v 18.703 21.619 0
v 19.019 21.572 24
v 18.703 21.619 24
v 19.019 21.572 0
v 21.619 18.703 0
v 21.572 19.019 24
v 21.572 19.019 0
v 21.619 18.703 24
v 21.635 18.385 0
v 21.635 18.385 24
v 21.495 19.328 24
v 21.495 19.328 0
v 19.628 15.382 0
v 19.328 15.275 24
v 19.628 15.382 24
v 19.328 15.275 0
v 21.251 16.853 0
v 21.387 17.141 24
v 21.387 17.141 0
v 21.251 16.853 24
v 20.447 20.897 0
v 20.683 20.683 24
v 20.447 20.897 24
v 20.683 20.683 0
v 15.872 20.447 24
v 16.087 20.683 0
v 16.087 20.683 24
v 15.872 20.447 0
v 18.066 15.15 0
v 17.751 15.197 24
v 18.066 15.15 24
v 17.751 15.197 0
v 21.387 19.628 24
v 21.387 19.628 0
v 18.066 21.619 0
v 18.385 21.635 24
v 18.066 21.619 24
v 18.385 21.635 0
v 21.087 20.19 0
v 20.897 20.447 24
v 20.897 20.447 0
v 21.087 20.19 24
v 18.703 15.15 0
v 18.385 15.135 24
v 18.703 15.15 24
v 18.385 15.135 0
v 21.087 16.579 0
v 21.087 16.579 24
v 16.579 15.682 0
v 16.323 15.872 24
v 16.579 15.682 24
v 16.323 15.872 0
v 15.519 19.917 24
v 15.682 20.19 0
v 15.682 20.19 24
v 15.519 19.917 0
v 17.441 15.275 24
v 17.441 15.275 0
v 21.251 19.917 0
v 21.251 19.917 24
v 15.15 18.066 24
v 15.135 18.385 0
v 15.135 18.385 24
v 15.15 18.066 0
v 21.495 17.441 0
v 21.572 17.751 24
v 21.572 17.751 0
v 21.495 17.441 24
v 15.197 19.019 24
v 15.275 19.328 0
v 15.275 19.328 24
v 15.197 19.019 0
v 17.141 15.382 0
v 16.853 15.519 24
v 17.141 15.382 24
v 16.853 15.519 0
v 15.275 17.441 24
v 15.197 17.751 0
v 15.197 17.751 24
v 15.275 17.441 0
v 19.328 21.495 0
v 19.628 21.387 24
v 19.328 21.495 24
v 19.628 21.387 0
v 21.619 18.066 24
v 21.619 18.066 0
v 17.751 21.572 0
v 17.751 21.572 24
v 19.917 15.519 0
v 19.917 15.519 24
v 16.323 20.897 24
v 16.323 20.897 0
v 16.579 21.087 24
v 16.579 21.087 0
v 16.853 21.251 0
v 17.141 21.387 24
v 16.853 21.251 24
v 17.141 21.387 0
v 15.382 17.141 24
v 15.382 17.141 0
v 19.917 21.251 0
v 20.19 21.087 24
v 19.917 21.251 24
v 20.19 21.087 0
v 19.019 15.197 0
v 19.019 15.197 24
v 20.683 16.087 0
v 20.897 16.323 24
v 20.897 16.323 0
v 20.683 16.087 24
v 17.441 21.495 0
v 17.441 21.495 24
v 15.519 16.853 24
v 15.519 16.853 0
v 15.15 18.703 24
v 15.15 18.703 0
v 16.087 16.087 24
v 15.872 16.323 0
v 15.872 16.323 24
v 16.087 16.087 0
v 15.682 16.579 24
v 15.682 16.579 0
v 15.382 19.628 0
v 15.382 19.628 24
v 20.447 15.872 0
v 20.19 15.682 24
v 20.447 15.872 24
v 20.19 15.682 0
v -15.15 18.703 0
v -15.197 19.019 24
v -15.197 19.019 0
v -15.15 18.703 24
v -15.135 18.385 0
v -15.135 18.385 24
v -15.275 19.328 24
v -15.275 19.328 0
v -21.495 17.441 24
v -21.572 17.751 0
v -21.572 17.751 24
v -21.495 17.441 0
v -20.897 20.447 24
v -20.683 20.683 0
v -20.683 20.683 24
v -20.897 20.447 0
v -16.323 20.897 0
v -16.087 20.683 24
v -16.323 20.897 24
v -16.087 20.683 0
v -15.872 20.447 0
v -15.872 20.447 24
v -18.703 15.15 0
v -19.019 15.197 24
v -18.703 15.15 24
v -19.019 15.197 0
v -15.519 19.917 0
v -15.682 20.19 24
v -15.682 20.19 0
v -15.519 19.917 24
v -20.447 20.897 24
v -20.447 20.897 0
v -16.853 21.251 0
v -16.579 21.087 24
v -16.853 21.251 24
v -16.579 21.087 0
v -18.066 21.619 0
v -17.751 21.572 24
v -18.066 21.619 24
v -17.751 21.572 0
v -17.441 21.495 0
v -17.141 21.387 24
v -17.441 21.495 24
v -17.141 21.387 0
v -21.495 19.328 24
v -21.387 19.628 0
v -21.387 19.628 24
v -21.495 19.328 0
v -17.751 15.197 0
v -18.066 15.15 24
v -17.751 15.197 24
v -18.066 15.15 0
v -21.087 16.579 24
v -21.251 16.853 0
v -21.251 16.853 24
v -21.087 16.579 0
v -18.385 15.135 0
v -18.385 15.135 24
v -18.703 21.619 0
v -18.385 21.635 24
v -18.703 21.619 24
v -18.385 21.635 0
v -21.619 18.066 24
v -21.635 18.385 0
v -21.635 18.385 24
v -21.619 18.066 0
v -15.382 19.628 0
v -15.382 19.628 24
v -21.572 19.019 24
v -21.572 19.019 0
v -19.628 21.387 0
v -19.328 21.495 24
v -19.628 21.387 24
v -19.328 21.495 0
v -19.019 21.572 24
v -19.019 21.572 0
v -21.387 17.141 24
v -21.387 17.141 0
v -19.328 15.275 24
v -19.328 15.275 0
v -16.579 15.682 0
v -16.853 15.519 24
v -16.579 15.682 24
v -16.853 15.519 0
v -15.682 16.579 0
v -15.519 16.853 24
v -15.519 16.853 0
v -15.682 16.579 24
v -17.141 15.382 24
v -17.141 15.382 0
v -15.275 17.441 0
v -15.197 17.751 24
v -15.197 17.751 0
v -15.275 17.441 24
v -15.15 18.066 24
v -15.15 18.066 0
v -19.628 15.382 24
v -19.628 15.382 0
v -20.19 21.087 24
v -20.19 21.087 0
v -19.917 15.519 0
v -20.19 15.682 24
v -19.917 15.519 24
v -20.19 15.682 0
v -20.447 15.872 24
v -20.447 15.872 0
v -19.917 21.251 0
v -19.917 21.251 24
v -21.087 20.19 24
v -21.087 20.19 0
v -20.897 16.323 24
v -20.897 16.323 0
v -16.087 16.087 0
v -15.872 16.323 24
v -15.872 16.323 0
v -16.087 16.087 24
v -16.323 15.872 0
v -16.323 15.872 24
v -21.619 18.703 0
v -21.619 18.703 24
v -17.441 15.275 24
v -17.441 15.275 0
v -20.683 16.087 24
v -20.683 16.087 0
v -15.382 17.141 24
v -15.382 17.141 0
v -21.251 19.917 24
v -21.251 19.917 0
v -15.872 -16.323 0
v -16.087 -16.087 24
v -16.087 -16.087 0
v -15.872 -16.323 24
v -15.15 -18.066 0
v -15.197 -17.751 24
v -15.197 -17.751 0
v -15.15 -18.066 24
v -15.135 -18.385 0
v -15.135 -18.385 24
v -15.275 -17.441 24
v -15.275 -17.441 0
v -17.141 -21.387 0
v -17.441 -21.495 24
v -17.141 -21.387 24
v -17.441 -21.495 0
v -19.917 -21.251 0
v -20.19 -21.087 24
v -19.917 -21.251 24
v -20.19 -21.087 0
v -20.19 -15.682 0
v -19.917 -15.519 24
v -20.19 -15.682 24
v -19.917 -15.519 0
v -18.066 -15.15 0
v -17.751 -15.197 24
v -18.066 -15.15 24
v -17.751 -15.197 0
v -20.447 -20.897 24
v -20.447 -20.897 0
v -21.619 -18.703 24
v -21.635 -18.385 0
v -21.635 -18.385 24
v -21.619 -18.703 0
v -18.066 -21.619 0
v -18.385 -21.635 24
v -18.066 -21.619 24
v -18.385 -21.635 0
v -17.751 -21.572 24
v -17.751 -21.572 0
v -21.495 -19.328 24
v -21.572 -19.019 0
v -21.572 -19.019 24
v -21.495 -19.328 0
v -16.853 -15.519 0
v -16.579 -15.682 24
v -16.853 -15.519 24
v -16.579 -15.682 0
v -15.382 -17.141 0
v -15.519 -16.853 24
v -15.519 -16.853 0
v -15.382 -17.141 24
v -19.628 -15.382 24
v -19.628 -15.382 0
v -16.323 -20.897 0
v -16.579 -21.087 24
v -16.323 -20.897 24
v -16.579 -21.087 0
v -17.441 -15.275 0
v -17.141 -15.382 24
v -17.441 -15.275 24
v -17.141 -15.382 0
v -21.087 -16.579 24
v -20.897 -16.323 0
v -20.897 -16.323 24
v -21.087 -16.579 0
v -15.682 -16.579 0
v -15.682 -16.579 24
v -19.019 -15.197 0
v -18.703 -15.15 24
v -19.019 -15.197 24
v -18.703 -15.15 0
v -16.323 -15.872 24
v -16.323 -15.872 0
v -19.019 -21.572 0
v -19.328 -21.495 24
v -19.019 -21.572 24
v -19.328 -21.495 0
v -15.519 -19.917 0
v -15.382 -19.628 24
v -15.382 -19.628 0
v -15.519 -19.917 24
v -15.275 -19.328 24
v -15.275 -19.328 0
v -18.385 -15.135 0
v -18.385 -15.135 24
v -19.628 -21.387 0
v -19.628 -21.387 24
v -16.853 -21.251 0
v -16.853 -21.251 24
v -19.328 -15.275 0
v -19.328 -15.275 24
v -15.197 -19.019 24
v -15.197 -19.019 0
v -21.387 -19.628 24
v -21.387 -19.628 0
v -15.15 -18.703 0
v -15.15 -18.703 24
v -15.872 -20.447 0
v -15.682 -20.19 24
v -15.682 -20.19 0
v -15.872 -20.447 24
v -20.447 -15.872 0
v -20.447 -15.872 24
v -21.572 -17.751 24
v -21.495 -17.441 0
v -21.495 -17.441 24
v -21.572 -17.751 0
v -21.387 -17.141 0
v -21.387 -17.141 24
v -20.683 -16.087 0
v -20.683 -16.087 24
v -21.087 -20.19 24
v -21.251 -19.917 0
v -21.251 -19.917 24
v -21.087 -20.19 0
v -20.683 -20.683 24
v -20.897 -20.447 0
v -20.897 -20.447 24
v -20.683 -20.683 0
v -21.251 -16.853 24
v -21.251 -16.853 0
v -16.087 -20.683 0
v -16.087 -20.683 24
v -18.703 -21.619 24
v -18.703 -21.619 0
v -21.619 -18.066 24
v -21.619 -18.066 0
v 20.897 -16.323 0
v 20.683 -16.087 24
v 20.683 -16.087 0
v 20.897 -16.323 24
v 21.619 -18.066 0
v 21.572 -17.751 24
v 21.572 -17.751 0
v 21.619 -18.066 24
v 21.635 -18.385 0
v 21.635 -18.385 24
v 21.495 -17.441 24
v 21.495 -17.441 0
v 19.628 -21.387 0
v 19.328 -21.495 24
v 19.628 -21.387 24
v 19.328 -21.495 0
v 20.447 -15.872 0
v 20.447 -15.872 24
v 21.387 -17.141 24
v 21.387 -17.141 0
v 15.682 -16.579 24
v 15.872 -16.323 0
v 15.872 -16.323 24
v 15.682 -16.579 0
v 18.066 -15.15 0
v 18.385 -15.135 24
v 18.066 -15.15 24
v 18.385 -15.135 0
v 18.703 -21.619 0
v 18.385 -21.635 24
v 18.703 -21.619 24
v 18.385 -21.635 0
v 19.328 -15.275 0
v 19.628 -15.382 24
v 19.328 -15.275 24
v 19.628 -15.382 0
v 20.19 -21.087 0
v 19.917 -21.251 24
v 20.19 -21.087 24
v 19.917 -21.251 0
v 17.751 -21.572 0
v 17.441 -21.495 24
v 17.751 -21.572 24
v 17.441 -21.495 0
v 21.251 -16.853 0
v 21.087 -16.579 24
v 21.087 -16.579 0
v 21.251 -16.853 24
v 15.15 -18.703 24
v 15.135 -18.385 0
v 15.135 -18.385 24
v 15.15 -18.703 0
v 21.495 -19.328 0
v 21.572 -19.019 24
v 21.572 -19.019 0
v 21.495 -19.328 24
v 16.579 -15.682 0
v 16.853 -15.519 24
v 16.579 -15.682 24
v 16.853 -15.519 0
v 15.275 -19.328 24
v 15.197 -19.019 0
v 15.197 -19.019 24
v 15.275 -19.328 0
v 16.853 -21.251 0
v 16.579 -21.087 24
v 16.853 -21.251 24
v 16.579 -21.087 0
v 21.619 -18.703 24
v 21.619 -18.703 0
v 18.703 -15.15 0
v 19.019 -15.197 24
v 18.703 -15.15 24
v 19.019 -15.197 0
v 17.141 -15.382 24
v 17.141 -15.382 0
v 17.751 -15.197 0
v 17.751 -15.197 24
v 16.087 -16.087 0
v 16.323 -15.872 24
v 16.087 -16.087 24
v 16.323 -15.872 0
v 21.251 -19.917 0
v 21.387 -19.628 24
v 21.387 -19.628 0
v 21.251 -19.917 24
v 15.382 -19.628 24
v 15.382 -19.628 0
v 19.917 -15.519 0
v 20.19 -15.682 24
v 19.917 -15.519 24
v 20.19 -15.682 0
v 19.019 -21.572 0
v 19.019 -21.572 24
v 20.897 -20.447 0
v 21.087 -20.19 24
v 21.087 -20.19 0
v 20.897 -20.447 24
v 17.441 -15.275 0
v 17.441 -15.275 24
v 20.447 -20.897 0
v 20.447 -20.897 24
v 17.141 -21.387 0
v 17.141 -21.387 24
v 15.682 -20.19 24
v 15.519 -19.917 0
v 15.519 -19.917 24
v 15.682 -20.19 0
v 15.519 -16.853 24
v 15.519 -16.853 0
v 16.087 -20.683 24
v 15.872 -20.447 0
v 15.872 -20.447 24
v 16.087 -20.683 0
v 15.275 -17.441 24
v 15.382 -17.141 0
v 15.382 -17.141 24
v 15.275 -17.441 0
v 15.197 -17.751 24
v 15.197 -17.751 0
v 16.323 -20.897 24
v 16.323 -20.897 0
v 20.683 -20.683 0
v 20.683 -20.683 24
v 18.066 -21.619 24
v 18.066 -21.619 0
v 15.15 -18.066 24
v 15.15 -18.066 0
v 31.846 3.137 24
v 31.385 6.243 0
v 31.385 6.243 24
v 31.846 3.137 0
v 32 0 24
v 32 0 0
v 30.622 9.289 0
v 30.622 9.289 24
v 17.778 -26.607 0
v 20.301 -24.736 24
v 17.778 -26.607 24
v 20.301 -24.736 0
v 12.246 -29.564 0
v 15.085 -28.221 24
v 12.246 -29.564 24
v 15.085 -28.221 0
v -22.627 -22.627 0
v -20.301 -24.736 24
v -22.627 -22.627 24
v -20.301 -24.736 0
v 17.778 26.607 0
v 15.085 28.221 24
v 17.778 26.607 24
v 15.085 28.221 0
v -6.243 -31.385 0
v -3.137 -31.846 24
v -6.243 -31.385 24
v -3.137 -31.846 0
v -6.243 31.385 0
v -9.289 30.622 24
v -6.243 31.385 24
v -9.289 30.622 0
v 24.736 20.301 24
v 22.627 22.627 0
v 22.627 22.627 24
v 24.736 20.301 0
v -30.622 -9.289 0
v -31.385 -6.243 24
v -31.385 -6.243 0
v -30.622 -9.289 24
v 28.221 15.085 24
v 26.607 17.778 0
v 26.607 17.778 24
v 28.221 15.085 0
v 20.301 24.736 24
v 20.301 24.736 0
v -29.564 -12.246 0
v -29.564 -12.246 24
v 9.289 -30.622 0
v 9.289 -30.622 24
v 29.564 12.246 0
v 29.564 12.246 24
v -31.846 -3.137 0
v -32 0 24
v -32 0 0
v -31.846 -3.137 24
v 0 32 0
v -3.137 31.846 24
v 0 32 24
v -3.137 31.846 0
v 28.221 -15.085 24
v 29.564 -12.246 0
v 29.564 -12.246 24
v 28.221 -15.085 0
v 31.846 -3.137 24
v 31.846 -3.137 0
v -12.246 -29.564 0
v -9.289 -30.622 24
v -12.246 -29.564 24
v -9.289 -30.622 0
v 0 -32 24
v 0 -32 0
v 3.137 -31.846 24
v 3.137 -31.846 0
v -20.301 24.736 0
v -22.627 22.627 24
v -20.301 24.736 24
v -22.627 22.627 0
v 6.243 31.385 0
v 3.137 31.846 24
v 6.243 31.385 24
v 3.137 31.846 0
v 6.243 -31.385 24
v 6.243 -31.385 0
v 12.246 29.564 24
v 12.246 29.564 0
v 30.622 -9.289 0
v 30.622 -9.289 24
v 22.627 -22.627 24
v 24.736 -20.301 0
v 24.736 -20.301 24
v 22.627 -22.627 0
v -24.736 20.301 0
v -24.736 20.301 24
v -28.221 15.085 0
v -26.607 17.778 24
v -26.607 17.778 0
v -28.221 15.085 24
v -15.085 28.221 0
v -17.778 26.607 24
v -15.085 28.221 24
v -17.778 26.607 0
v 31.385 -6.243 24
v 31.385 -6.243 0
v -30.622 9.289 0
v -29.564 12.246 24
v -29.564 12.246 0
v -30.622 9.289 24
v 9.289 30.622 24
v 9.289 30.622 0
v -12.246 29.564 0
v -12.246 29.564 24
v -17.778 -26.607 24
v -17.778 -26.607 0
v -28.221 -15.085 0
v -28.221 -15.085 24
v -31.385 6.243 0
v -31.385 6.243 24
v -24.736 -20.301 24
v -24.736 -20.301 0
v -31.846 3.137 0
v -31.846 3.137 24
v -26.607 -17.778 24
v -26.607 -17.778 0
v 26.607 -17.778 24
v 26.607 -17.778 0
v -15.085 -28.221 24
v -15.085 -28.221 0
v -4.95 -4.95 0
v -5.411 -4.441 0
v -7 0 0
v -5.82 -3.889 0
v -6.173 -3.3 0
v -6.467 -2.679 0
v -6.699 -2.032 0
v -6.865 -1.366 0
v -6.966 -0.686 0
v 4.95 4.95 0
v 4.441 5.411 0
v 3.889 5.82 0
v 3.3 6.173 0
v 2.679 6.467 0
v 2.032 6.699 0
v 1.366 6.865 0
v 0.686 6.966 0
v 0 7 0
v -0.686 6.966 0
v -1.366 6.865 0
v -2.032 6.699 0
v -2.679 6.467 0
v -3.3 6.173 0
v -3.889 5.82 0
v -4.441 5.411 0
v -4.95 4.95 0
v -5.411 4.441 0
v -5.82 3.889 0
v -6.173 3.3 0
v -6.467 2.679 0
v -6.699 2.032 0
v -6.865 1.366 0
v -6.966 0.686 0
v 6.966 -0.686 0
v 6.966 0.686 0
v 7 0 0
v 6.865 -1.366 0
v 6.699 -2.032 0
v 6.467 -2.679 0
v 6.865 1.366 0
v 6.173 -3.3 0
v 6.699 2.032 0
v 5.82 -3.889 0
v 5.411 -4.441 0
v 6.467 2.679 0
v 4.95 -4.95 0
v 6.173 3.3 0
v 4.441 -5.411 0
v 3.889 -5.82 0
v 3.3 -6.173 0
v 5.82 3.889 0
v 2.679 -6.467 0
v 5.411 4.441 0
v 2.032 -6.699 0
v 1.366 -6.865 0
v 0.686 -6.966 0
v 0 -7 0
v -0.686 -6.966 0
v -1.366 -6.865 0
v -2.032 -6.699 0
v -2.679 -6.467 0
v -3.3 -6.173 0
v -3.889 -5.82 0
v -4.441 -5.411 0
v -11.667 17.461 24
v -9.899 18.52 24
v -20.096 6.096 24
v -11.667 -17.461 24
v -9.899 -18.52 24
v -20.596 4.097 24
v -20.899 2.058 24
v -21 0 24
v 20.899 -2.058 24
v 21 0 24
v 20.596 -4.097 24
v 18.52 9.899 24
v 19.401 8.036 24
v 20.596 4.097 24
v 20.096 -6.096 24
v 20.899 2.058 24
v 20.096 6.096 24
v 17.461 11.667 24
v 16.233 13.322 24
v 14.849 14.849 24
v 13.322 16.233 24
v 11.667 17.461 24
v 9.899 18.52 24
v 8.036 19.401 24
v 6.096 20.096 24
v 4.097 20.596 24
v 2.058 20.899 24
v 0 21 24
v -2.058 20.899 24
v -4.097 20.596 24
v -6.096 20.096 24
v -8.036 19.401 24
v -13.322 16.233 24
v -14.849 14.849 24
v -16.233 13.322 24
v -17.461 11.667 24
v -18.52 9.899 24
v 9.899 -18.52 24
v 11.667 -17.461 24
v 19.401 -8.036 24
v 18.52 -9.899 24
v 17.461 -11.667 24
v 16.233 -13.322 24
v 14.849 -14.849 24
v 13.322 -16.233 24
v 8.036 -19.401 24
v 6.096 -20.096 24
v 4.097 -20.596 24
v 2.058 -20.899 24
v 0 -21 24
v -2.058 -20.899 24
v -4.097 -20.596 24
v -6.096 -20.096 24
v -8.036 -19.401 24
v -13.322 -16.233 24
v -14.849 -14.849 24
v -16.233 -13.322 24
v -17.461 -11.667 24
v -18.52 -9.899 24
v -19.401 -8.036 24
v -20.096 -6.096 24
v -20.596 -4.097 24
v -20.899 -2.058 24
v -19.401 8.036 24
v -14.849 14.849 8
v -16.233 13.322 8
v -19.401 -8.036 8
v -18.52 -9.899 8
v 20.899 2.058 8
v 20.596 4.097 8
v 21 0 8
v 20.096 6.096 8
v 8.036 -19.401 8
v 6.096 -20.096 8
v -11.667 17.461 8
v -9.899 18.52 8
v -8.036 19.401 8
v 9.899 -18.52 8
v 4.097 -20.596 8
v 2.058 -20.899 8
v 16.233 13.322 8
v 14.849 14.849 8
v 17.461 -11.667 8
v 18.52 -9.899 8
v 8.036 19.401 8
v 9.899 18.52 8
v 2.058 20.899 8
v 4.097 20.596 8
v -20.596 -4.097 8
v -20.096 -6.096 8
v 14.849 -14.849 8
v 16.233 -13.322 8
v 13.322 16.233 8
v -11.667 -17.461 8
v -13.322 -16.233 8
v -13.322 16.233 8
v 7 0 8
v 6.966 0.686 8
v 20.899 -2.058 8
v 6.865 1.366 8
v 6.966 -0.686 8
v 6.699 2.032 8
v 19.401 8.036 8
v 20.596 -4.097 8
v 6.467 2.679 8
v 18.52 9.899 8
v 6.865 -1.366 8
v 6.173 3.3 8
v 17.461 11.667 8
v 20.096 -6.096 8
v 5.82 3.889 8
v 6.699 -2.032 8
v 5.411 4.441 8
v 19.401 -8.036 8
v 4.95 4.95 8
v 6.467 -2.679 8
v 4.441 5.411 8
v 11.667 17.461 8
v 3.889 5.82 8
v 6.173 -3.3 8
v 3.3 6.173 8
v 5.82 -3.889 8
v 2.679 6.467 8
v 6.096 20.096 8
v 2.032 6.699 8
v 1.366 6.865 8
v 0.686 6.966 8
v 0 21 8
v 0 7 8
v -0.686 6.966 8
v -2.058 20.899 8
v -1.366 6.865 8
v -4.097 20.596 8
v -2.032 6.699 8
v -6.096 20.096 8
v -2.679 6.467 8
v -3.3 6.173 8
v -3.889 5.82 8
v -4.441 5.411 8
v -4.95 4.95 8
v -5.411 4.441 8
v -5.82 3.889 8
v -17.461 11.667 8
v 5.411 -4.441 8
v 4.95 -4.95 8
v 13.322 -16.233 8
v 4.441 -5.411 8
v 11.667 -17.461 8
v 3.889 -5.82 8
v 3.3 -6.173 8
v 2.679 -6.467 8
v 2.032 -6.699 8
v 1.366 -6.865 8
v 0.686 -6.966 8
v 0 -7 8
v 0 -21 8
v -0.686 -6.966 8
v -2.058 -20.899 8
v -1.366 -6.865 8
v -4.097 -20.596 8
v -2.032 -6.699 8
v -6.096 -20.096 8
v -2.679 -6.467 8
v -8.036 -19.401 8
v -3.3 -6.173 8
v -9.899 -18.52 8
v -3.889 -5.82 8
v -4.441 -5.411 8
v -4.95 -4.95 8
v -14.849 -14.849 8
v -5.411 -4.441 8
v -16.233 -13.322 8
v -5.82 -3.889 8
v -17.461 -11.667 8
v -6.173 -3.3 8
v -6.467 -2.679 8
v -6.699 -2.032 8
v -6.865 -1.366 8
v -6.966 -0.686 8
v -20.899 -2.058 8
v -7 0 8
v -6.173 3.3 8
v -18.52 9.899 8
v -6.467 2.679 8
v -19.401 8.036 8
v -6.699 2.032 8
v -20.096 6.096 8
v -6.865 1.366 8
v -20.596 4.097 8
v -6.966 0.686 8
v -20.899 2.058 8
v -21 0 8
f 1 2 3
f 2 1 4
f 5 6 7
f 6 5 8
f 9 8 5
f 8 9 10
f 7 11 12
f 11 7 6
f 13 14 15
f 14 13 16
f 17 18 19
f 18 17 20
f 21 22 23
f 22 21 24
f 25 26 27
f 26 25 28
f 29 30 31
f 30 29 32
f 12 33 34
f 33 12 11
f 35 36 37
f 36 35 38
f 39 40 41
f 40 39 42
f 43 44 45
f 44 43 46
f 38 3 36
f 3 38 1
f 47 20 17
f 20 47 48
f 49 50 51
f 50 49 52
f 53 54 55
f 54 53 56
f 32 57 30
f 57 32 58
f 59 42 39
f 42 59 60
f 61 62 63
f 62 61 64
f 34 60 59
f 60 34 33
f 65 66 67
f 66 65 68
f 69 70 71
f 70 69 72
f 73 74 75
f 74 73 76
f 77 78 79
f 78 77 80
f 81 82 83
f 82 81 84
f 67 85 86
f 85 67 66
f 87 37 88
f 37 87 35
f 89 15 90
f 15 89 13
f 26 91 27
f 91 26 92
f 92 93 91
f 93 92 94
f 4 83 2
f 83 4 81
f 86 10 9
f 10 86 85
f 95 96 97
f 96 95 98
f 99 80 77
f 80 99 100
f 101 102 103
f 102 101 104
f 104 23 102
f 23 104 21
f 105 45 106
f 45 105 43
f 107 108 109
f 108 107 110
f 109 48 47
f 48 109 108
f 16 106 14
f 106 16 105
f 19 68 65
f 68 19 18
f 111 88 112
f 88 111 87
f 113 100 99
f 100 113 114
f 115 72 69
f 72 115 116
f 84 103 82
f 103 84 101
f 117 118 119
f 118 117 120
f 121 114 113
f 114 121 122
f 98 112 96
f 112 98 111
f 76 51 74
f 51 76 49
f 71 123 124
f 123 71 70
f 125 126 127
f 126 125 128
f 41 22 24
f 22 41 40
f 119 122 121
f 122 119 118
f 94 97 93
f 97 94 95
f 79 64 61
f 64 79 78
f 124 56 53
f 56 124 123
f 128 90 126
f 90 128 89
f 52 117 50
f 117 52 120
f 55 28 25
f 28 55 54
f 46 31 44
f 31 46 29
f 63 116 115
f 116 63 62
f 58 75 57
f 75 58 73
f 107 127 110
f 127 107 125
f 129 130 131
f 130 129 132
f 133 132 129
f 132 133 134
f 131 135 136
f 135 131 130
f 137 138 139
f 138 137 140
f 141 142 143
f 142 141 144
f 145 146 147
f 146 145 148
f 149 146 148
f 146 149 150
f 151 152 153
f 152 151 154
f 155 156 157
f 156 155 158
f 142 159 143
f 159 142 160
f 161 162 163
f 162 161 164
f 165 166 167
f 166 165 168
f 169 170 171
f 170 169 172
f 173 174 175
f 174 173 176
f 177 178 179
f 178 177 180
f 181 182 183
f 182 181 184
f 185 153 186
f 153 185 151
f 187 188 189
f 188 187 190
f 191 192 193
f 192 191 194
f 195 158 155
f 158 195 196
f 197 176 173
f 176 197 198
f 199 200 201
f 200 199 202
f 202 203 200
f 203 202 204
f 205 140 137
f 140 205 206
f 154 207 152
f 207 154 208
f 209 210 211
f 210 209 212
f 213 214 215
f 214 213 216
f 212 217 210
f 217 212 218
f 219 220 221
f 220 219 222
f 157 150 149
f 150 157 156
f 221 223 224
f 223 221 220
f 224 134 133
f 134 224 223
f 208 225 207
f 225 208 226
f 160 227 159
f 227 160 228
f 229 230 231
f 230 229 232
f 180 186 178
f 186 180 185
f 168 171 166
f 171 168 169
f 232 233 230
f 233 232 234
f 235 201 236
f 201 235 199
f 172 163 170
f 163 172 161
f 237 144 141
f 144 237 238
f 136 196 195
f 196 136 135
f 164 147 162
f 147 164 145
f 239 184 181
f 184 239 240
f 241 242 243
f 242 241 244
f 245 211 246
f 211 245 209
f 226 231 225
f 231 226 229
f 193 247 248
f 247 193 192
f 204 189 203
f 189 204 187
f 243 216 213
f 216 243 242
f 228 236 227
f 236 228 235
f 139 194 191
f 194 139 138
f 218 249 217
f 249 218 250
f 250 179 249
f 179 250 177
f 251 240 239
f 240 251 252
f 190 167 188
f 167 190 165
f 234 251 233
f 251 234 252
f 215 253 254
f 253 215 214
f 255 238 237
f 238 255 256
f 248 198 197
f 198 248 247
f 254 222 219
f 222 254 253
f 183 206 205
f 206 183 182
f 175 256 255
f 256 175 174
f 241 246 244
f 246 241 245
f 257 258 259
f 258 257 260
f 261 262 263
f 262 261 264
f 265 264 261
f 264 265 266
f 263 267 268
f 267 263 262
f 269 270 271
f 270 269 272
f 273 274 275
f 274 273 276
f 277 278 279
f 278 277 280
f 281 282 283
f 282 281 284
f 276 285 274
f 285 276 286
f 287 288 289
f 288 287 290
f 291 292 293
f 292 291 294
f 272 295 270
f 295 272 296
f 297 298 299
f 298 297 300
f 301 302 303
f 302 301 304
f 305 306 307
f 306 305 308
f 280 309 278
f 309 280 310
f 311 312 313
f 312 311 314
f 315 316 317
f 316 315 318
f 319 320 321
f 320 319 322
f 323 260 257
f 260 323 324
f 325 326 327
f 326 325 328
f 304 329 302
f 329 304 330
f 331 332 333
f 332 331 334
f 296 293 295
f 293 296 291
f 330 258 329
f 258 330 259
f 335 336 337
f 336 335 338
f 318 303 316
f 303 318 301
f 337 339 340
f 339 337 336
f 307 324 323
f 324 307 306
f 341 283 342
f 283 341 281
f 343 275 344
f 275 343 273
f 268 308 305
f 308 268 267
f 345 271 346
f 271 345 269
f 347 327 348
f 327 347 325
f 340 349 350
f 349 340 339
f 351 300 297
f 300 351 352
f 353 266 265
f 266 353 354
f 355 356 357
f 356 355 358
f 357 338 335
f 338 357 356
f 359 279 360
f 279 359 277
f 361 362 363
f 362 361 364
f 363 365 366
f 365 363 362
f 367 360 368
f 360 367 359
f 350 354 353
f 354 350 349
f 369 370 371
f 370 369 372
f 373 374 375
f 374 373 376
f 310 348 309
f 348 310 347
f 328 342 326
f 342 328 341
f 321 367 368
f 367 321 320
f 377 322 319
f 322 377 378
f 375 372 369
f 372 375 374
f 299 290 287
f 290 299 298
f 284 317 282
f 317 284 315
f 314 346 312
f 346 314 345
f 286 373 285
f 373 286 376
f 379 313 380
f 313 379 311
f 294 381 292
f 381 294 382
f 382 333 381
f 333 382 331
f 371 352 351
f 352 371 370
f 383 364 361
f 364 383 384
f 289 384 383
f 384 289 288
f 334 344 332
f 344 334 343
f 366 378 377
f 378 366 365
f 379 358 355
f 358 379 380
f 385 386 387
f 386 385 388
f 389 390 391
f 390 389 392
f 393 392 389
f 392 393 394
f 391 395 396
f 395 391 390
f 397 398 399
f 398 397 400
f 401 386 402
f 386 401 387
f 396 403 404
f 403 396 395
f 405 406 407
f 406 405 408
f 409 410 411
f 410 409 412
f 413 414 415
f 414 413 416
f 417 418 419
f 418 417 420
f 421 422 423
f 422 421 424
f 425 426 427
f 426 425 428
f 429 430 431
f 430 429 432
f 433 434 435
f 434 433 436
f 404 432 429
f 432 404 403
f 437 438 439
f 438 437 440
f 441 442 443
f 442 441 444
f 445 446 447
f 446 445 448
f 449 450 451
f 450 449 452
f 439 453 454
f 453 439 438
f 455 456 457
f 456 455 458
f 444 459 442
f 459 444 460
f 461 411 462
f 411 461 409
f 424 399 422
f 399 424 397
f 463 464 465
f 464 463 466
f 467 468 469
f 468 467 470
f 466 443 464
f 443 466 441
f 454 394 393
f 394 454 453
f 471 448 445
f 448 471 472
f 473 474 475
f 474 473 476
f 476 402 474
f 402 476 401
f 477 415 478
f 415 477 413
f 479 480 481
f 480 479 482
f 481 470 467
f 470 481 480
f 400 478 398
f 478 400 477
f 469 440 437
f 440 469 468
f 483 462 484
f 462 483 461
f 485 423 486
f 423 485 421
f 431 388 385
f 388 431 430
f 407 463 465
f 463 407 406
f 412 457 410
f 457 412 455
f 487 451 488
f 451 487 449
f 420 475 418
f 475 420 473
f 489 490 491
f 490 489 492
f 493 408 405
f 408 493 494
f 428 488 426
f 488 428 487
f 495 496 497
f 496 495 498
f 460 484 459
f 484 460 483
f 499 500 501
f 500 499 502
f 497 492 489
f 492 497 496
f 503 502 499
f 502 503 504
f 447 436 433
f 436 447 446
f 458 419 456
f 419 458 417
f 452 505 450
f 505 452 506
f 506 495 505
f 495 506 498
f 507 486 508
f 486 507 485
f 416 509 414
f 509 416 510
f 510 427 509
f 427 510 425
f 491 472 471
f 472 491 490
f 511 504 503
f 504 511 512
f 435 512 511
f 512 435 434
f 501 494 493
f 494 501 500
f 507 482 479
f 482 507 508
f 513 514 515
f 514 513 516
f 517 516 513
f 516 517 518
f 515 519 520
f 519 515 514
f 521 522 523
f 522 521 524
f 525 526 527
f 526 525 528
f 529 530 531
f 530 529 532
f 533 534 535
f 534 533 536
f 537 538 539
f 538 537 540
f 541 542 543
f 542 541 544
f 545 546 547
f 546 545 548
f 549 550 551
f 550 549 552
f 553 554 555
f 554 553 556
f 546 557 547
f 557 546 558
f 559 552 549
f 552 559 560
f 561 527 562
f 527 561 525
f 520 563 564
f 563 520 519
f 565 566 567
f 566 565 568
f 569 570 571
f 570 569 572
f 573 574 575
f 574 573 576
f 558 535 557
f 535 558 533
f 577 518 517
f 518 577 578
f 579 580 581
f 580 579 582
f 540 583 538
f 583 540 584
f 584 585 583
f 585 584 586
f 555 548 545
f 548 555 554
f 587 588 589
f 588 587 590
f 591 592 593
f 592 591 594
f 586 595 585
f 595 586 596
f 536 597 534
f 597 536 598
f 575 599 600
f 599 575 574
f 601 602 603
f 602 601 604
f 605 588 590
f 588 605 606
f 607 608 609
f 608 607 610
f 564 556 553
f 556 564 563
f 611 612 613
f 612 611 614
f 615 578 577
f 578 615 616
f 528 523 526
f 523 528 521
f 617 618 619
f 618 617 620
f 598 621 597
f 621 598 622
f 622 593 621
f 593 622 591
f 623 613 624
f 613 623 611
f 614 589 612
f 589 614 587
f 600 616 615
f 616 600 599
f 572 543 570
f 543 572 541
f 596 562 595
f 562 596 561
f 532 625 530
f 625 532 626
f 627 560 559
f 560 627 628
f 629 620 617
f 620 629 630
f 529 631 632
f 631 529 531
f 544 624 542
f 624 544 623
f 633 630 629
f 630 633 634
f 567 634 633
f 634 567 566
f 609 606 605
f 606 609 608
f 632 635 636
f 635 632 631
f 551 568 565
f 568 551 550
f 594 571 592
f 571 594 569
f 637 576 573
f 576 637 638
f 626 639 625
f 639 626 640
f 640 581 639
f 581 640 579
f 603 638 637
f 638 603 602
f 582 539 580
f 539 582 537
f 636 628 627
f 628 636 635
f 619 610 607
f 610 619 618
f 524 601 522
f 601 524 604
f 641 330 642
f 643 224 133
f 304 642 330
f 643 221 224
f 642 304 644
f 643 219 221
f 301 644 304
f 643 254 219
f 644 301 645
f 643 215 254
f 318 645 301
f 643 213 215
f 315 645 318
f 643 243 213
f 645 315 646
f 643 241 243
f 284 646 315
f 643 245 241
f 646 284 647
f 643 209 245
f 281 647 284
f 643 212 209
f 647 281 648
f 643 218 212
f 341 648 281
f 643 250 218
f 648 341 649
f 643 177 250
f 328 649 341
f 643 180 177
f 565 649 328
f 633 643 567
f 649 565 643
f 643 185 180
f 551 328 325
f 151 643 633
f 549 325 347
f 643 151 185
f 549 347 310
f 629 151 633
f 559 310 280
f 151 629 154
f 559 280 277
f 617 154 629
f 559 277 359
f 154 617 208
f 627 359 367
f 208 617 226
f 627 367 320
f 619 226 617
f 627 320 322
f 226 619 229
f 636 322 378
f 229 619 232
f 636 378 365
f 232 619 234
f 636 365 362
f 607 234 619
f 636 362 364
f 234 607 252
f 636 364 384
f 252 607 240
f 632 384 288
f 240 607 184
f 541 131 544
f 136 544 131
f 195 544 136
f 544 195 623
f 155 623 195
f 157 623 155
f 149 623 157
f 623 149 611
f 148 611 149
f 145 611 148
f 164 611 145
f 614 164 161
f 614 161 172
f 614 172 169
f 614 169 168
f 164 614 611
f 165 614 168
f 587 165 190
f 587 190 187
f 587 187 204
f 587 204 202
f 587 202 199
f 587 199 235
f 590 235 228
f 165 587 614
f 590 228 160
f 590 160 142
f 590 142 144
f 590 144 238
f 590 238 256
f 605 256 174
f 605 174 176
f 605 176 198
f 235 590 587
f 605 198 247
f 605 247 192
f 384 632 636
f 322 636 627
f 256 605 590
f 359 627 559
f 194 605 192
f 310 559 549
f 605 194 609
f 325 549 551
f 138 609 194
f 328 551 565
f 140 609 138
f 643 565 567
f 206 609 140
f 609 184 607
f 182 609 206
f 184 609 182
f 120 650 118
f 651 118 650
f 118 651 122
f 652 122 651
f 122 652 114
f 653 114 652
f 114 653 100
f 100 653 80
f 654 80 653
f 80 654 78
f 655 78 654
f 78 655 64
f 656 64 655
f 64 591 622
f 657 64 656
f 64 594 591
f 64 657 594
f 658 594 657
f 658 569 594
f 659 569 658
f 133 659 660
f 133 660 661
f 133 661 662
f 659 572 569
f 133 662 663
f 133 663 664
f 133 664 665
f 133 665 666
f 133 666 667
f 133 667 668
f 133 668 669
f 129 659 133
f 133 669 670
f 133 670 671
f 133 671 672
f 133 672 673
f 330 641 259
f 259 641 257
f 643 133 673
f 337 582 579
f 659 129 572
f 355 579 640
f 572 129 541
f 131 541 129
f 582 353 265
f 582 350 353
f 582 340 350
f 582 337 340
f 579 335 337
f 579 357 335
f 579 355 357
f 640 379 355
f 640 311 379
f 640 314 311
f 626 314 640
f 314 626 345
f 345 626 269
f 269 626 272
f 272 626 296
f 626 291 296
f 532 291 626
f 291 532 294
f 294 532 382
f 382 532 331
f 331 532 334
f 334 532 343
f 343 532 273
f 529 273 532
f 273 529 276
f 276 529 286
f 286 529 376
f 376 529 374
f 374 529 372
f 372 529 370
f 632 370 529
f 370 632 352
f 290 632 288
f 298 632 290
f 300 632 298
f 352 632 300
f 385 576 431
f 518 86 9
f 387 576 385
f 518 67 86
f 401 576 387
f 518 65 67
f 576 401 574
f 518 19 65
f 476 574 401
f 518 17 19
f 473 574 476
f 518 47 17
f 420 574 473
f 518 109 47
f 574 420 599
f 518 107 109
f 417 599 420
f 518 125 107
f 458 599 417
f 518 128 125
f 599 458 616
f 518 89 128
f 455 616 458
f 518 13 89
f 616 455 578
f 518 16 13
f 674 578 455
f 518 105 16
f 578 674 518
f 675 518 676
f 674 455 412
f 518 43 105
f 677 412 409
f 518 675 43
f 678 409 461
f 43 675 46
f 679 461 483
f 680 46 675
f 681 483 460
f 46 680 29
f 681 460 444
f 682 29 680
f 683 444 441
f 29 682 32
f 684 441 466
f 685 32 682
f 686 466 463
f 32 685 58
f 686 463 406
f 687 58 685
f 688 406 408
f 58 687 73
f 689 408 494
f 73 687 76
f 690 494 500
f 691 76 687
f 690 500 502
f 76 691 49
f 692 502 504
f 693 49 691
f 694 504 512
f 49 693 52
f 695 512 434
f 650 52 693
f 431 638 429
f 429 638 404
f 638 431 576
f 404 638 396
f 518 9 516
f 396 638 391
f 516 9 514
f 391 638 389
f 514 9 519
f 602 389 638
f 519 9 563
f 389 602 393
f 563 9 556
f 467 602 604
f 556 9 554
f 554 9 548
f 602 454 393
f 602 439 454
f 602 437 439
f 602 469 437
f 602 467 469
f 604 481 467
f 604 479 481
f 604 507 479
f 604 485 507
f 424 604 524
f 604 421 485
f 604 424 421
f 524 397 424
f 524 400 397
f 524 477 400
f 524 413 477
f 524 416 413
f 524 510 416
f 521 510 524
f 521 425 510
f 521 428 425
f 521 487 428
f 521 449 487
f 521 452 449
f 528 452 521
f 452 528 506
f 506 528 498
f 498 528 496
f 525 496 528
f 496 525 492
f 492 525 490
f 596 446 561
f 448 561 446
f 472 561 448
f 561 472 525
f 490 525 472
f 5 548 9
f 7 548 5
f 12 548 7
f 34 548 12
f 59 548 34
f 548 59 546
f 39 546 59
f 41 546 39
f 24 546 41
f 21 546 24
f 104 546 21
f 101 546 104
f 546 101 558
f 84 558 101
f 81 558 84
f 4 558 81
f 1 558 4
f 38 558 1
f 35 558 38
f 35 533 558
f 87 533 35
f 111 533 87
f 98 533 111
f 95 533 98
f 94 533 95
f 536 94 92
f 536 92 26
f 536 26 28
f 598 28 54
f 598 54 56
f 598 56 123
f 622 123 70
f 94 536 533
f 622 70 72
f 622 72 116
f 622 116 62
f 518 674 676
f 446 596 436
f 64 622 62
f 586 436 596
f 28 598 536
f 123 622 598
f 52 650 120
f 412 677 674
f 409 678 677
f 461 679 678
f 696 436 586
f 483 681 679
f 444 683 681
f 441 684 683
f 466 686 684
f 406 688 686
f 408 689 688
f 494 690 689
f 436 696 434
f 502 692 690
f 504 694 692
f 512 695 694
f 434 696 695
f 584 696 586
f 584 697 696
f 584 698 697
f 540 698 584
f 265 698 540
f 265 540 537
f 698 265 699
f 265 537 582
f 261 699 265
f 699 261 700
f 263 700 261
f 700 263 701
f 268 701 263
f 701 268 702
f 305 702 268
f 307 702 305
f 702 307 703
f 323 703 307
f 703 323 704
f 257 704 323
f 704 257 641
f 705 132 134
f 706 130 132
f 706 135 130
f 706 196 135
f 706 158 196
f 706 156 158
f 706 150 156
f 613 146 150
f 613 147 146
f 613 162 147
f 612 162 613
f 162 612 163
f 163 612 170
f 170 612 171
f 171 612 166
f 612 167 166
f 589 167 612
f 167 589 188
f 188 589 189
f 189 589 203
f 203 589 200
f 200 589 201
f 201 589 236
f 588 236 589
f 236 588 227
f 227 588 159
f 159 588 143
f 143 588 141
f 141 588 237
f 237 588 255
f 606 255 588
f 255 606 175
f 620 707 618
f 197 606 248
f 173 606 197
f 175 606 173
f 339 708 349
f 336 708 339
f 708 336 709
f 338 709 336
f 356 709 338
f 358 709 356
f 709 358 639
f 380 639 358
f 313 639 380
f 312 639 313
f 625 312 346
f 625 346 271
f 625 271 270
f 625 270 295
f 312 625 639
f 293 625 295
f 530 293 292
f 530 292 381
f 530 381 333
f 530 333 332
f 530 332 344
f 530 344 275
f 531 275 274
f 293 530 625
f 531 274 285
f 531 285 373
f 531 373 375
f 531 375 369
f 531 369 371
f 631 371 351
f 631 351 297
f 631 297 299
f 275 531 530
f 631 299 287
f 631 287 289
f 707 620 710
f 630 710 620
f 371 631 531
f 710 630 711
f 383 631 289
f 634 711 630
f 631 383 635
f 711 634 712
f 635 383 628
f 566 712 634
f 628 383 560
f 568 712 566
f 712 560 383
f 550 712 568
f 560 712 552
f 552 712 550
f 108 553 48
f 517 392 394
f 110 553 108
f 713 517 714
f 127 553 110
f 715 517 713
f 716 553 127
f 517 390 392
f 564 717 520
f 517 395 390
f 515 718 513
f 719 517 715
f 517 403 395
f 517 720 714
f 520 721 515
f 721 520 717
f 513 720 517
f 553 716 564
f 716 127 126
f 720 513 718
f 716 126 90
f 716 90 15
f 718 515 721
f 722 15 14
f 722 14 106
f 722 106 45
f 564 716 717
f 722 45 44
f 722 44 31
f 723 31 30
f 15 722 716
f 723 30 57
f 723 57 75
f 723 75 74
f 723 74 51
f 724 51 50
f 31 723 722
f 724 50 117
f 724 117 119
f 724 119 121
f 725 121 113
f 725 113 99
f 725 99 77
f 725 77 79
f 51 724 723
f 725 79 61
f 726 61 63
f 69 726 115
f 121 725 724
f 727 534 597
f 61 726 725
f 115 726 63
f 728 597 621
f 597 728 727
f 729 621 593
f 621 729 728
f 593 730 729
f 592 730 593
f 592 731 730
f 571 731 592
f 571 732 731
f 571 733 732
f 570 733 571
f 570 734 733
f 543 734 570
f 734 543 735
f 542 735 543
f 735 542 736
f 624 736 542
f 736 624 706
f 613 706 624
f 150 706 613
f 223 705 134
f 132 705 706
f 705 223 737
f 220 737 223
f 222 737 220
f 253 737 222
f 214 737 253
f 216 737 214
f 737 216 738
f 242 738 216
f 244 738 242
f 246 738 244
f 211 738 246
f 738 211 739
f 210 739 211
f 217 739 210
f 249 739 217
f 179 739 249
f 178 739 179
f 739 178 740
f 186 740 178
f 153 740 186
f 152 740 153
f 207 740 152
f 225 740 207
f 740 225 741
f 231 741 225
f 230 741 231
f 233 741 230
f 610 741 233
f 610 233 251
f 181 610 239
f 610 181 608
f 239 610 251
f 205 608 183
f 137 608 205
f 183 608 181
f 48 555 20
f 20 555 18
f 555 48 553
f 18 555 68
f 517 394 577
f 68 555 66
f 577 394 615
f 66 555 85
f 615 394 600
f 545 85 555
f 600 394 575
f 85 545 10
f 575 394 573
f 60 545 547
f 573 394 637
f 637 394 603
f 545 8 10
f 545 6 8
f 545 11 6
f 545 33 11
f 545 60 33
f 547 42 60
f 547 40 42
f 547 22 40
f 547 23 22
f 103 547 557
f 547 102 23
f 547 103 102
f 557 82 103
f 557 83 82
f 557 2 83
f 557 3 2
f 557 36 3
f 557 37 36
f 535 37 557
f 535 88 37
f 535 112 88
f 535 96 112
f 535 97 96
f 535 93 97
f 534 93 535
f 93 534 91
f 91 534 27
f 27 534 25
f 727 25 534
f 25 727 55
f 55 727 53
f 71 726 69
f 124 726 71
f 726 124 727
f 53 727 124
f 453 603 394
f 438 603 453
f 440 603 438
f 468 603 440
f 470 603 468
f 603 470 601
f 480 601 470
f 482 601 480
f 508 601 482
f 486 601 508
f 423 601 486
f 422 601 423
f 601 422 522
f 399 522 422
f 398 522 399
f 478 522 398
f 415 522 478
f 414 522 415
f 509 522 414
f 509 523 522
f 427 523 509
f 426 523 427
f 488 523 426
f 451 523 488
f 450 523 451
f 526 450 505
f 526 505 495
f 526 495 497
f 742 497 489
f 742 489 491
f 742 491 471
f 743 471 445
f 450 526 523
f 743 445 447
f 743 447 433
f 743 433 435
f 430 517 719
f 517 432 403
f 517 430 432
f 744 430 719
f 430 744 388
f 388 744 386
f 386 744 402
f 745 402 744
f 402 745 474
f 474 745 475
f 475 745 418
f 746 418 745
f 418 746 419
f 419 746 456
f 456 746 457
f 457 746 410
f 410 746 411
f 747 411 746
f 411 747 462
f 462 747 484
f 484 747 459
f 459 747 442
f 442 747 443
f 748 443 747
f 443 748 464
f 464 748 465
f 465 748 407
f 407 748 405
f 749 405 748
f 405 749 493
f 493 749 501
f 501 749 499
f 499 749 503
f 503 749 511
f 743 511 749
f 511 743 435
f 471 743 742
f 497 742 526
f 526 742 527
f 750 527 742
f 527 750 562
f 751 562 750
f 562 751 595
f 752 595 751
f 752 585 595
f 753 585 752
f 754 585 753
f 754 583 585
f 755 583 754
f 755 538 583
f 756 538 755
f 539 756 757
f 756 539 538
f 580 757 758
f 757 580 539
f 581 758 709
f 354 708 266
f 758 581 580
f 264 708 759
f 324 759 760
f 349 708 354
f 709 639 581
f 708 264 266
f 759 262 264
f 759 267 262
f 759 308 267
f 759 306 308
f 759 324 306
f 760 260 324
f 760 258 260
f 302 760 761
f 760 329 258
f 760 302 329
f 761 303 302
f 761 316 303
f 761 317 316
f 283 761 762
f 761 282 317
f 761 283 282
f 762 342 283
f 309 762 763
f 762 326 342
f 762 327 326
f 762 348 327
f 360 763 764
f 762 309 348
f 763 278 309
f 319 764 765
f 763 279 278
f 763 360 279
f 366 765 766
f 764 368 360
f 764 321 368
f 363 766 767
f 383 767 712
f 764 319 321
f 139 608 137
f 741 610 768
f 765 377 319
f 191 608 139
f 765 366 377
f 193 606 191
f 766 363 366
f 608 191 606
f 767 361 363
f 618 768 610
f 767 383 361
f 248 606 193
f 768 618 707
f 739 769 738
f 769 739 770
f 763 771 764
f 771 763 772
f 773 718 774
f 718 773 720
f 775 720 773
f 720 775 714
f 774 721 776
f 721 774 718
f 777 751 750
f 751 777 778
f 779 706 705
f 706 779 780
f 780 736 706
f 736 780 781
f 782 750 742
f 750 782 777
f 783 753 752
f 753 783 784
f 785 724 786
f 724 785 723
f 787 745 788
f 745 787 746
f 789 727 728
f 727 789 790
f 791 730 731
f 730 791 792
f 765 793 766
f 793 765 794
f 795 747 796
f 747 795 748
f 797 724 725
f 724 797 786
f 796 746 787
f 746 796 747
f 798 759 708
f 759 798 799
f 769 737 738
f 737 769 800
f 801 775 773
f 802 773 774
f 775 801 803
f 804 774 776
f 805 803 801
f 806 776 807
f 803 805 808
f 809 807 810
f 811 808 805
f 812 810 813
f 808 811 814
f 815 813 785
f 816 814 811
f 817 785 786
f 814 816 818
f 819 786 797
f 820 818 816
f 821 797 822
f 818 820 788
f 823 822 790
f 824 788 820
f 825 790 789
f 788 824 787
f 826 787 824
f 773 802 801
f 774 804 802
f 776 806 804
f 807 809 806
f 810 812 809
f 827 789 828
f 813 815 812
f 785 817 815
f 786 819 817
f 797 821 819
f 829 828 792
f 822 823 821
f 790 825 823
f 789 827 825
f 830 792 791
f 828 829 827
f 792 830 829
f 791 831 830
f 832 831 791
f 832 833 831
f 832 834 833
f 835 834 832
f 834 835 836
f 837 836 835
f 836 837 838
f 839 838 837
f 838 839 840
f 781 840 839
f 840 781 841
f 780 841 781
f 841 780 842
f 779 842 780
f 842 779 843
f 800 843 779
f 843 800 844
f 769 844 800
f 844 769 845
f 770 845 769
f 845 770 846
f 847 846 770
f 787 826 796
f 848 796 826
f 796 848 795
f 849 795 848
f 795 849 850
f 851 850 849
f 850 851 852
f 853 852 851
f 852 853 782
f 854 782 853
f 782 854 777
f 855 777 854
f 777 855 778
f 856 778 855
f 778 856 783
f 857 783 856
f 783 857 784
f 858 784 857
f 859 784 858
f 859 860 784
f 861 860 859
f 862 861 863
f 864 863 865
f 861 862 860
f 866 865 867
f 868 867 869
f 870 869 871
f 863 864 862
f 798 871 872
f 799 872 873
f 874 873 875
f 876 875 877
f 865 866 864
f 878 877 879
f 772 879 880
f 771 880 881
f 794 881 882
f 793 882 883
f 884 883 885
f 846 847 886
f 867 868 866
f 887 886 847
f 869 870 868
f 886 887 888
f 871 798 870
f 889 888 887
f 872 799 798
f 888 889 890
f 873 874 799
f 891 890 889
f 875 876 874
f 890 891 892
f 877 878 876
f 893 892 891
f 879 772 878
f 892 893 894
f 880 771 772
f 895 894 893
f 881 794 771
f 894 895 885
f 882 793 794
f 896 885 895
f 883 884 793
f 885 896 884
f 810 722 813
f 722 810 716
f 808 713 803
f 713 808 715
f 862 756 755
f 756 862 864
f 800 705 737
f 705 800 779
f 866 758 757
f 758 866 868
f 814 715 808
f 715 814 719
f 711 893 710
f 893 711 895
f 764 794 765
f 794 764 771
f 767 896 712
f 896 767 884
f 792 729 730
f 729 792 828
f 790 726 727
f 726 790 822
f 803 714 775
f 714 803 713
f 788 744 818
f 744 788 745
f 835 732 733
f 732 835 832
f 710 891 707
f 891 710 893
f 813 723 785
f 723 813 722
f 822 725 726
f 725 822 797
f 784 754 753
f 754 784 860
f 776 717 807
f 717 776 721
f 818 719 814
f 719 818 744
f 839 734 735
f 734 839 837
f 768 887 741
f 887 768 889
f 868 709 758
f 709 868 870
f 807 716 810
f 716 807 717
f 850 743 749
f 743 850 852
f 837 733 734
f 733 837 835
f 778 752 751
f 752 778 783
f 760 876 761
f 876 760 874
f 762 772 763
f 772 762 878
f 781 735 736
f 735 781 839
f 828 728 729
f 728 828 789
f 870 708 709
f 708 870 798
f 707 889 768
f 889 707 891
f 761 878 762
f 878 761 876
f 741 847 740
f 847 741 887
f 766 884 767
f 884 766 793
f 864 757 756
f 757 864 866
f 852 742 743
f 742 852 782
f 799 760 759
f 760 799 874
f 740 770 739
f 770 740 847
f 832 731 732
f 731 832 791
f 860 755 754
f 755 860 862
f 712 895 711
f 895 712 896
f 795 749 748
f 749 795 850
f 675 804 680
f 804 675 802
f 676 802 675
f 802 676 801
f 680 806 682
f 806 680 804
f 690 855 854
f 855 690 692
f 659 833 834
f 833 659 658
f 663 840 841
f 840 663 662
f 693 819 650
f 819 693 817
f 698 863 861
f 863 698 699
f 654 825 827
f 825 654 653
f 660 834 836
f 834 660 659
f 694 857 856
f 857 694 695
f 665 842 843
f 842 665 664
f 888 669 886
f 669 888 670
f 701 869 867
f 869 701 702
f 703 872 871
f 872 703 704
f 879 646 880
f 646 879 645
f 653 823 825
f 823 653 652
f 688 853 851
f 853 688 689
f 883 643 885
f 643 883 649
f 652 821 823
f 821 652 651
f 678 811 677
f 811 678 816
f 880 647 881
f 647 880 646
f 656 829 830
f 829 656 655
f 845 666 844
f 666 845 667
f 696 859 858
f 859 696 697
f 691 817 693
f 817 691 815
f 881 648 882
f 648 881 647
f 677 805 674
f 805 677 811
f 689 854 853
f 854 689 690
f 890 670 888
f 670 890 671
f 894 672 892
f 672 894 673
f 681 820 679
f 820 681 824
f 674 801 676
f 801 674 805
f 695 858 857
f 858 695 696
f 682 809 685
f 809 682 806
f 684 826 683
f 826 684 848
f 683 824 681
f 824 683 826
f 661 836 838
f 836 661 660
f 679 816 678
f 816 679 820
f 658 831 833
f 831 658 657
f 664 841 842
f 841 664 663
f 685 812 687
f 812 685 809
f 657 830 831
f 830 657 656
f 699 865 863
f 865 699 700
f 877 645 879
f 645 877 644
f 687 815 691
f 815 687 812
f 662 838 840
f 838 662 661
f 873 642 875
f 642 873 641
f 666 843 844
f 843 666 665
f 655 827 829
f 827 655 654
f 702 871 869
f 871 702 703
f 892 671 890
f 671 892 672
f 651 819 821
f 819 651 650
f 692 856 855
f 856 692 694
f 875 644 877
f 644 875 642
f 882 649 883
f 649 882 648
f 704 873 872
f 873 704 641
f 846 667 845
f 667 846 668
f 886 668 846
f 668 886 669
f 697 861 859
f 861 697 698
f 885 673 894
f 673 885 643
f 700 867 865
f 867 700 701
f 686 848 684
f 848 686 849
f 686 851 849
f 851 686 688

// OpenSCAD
// Original MechIntel educational model. CC0-1.0. Units: mm.
// Not a standardized or load-rated component.
$fn=96;
outer_diameter=64; height=24; pocket_diameter=42; pocket_depth=16; center_bore=14; hole_circle=52; hole_diameter=6.5;
$fn=64;
difference(){cylinder(d=outer_diameter,h=height);
 translate([0,0,height-pocket_depth]) cylinder(d=pocket_diameter,h=pocket_depth+1);
 translate([0,0,-1]) cylinder(d=center_bore,h=height+2);
 for(a=[45:90:315]) translate([hole_circle/2*cos(a),hole_circle/2*sin(a),-1]) cylinder(d=hole_diameter,h=height+2);
}
